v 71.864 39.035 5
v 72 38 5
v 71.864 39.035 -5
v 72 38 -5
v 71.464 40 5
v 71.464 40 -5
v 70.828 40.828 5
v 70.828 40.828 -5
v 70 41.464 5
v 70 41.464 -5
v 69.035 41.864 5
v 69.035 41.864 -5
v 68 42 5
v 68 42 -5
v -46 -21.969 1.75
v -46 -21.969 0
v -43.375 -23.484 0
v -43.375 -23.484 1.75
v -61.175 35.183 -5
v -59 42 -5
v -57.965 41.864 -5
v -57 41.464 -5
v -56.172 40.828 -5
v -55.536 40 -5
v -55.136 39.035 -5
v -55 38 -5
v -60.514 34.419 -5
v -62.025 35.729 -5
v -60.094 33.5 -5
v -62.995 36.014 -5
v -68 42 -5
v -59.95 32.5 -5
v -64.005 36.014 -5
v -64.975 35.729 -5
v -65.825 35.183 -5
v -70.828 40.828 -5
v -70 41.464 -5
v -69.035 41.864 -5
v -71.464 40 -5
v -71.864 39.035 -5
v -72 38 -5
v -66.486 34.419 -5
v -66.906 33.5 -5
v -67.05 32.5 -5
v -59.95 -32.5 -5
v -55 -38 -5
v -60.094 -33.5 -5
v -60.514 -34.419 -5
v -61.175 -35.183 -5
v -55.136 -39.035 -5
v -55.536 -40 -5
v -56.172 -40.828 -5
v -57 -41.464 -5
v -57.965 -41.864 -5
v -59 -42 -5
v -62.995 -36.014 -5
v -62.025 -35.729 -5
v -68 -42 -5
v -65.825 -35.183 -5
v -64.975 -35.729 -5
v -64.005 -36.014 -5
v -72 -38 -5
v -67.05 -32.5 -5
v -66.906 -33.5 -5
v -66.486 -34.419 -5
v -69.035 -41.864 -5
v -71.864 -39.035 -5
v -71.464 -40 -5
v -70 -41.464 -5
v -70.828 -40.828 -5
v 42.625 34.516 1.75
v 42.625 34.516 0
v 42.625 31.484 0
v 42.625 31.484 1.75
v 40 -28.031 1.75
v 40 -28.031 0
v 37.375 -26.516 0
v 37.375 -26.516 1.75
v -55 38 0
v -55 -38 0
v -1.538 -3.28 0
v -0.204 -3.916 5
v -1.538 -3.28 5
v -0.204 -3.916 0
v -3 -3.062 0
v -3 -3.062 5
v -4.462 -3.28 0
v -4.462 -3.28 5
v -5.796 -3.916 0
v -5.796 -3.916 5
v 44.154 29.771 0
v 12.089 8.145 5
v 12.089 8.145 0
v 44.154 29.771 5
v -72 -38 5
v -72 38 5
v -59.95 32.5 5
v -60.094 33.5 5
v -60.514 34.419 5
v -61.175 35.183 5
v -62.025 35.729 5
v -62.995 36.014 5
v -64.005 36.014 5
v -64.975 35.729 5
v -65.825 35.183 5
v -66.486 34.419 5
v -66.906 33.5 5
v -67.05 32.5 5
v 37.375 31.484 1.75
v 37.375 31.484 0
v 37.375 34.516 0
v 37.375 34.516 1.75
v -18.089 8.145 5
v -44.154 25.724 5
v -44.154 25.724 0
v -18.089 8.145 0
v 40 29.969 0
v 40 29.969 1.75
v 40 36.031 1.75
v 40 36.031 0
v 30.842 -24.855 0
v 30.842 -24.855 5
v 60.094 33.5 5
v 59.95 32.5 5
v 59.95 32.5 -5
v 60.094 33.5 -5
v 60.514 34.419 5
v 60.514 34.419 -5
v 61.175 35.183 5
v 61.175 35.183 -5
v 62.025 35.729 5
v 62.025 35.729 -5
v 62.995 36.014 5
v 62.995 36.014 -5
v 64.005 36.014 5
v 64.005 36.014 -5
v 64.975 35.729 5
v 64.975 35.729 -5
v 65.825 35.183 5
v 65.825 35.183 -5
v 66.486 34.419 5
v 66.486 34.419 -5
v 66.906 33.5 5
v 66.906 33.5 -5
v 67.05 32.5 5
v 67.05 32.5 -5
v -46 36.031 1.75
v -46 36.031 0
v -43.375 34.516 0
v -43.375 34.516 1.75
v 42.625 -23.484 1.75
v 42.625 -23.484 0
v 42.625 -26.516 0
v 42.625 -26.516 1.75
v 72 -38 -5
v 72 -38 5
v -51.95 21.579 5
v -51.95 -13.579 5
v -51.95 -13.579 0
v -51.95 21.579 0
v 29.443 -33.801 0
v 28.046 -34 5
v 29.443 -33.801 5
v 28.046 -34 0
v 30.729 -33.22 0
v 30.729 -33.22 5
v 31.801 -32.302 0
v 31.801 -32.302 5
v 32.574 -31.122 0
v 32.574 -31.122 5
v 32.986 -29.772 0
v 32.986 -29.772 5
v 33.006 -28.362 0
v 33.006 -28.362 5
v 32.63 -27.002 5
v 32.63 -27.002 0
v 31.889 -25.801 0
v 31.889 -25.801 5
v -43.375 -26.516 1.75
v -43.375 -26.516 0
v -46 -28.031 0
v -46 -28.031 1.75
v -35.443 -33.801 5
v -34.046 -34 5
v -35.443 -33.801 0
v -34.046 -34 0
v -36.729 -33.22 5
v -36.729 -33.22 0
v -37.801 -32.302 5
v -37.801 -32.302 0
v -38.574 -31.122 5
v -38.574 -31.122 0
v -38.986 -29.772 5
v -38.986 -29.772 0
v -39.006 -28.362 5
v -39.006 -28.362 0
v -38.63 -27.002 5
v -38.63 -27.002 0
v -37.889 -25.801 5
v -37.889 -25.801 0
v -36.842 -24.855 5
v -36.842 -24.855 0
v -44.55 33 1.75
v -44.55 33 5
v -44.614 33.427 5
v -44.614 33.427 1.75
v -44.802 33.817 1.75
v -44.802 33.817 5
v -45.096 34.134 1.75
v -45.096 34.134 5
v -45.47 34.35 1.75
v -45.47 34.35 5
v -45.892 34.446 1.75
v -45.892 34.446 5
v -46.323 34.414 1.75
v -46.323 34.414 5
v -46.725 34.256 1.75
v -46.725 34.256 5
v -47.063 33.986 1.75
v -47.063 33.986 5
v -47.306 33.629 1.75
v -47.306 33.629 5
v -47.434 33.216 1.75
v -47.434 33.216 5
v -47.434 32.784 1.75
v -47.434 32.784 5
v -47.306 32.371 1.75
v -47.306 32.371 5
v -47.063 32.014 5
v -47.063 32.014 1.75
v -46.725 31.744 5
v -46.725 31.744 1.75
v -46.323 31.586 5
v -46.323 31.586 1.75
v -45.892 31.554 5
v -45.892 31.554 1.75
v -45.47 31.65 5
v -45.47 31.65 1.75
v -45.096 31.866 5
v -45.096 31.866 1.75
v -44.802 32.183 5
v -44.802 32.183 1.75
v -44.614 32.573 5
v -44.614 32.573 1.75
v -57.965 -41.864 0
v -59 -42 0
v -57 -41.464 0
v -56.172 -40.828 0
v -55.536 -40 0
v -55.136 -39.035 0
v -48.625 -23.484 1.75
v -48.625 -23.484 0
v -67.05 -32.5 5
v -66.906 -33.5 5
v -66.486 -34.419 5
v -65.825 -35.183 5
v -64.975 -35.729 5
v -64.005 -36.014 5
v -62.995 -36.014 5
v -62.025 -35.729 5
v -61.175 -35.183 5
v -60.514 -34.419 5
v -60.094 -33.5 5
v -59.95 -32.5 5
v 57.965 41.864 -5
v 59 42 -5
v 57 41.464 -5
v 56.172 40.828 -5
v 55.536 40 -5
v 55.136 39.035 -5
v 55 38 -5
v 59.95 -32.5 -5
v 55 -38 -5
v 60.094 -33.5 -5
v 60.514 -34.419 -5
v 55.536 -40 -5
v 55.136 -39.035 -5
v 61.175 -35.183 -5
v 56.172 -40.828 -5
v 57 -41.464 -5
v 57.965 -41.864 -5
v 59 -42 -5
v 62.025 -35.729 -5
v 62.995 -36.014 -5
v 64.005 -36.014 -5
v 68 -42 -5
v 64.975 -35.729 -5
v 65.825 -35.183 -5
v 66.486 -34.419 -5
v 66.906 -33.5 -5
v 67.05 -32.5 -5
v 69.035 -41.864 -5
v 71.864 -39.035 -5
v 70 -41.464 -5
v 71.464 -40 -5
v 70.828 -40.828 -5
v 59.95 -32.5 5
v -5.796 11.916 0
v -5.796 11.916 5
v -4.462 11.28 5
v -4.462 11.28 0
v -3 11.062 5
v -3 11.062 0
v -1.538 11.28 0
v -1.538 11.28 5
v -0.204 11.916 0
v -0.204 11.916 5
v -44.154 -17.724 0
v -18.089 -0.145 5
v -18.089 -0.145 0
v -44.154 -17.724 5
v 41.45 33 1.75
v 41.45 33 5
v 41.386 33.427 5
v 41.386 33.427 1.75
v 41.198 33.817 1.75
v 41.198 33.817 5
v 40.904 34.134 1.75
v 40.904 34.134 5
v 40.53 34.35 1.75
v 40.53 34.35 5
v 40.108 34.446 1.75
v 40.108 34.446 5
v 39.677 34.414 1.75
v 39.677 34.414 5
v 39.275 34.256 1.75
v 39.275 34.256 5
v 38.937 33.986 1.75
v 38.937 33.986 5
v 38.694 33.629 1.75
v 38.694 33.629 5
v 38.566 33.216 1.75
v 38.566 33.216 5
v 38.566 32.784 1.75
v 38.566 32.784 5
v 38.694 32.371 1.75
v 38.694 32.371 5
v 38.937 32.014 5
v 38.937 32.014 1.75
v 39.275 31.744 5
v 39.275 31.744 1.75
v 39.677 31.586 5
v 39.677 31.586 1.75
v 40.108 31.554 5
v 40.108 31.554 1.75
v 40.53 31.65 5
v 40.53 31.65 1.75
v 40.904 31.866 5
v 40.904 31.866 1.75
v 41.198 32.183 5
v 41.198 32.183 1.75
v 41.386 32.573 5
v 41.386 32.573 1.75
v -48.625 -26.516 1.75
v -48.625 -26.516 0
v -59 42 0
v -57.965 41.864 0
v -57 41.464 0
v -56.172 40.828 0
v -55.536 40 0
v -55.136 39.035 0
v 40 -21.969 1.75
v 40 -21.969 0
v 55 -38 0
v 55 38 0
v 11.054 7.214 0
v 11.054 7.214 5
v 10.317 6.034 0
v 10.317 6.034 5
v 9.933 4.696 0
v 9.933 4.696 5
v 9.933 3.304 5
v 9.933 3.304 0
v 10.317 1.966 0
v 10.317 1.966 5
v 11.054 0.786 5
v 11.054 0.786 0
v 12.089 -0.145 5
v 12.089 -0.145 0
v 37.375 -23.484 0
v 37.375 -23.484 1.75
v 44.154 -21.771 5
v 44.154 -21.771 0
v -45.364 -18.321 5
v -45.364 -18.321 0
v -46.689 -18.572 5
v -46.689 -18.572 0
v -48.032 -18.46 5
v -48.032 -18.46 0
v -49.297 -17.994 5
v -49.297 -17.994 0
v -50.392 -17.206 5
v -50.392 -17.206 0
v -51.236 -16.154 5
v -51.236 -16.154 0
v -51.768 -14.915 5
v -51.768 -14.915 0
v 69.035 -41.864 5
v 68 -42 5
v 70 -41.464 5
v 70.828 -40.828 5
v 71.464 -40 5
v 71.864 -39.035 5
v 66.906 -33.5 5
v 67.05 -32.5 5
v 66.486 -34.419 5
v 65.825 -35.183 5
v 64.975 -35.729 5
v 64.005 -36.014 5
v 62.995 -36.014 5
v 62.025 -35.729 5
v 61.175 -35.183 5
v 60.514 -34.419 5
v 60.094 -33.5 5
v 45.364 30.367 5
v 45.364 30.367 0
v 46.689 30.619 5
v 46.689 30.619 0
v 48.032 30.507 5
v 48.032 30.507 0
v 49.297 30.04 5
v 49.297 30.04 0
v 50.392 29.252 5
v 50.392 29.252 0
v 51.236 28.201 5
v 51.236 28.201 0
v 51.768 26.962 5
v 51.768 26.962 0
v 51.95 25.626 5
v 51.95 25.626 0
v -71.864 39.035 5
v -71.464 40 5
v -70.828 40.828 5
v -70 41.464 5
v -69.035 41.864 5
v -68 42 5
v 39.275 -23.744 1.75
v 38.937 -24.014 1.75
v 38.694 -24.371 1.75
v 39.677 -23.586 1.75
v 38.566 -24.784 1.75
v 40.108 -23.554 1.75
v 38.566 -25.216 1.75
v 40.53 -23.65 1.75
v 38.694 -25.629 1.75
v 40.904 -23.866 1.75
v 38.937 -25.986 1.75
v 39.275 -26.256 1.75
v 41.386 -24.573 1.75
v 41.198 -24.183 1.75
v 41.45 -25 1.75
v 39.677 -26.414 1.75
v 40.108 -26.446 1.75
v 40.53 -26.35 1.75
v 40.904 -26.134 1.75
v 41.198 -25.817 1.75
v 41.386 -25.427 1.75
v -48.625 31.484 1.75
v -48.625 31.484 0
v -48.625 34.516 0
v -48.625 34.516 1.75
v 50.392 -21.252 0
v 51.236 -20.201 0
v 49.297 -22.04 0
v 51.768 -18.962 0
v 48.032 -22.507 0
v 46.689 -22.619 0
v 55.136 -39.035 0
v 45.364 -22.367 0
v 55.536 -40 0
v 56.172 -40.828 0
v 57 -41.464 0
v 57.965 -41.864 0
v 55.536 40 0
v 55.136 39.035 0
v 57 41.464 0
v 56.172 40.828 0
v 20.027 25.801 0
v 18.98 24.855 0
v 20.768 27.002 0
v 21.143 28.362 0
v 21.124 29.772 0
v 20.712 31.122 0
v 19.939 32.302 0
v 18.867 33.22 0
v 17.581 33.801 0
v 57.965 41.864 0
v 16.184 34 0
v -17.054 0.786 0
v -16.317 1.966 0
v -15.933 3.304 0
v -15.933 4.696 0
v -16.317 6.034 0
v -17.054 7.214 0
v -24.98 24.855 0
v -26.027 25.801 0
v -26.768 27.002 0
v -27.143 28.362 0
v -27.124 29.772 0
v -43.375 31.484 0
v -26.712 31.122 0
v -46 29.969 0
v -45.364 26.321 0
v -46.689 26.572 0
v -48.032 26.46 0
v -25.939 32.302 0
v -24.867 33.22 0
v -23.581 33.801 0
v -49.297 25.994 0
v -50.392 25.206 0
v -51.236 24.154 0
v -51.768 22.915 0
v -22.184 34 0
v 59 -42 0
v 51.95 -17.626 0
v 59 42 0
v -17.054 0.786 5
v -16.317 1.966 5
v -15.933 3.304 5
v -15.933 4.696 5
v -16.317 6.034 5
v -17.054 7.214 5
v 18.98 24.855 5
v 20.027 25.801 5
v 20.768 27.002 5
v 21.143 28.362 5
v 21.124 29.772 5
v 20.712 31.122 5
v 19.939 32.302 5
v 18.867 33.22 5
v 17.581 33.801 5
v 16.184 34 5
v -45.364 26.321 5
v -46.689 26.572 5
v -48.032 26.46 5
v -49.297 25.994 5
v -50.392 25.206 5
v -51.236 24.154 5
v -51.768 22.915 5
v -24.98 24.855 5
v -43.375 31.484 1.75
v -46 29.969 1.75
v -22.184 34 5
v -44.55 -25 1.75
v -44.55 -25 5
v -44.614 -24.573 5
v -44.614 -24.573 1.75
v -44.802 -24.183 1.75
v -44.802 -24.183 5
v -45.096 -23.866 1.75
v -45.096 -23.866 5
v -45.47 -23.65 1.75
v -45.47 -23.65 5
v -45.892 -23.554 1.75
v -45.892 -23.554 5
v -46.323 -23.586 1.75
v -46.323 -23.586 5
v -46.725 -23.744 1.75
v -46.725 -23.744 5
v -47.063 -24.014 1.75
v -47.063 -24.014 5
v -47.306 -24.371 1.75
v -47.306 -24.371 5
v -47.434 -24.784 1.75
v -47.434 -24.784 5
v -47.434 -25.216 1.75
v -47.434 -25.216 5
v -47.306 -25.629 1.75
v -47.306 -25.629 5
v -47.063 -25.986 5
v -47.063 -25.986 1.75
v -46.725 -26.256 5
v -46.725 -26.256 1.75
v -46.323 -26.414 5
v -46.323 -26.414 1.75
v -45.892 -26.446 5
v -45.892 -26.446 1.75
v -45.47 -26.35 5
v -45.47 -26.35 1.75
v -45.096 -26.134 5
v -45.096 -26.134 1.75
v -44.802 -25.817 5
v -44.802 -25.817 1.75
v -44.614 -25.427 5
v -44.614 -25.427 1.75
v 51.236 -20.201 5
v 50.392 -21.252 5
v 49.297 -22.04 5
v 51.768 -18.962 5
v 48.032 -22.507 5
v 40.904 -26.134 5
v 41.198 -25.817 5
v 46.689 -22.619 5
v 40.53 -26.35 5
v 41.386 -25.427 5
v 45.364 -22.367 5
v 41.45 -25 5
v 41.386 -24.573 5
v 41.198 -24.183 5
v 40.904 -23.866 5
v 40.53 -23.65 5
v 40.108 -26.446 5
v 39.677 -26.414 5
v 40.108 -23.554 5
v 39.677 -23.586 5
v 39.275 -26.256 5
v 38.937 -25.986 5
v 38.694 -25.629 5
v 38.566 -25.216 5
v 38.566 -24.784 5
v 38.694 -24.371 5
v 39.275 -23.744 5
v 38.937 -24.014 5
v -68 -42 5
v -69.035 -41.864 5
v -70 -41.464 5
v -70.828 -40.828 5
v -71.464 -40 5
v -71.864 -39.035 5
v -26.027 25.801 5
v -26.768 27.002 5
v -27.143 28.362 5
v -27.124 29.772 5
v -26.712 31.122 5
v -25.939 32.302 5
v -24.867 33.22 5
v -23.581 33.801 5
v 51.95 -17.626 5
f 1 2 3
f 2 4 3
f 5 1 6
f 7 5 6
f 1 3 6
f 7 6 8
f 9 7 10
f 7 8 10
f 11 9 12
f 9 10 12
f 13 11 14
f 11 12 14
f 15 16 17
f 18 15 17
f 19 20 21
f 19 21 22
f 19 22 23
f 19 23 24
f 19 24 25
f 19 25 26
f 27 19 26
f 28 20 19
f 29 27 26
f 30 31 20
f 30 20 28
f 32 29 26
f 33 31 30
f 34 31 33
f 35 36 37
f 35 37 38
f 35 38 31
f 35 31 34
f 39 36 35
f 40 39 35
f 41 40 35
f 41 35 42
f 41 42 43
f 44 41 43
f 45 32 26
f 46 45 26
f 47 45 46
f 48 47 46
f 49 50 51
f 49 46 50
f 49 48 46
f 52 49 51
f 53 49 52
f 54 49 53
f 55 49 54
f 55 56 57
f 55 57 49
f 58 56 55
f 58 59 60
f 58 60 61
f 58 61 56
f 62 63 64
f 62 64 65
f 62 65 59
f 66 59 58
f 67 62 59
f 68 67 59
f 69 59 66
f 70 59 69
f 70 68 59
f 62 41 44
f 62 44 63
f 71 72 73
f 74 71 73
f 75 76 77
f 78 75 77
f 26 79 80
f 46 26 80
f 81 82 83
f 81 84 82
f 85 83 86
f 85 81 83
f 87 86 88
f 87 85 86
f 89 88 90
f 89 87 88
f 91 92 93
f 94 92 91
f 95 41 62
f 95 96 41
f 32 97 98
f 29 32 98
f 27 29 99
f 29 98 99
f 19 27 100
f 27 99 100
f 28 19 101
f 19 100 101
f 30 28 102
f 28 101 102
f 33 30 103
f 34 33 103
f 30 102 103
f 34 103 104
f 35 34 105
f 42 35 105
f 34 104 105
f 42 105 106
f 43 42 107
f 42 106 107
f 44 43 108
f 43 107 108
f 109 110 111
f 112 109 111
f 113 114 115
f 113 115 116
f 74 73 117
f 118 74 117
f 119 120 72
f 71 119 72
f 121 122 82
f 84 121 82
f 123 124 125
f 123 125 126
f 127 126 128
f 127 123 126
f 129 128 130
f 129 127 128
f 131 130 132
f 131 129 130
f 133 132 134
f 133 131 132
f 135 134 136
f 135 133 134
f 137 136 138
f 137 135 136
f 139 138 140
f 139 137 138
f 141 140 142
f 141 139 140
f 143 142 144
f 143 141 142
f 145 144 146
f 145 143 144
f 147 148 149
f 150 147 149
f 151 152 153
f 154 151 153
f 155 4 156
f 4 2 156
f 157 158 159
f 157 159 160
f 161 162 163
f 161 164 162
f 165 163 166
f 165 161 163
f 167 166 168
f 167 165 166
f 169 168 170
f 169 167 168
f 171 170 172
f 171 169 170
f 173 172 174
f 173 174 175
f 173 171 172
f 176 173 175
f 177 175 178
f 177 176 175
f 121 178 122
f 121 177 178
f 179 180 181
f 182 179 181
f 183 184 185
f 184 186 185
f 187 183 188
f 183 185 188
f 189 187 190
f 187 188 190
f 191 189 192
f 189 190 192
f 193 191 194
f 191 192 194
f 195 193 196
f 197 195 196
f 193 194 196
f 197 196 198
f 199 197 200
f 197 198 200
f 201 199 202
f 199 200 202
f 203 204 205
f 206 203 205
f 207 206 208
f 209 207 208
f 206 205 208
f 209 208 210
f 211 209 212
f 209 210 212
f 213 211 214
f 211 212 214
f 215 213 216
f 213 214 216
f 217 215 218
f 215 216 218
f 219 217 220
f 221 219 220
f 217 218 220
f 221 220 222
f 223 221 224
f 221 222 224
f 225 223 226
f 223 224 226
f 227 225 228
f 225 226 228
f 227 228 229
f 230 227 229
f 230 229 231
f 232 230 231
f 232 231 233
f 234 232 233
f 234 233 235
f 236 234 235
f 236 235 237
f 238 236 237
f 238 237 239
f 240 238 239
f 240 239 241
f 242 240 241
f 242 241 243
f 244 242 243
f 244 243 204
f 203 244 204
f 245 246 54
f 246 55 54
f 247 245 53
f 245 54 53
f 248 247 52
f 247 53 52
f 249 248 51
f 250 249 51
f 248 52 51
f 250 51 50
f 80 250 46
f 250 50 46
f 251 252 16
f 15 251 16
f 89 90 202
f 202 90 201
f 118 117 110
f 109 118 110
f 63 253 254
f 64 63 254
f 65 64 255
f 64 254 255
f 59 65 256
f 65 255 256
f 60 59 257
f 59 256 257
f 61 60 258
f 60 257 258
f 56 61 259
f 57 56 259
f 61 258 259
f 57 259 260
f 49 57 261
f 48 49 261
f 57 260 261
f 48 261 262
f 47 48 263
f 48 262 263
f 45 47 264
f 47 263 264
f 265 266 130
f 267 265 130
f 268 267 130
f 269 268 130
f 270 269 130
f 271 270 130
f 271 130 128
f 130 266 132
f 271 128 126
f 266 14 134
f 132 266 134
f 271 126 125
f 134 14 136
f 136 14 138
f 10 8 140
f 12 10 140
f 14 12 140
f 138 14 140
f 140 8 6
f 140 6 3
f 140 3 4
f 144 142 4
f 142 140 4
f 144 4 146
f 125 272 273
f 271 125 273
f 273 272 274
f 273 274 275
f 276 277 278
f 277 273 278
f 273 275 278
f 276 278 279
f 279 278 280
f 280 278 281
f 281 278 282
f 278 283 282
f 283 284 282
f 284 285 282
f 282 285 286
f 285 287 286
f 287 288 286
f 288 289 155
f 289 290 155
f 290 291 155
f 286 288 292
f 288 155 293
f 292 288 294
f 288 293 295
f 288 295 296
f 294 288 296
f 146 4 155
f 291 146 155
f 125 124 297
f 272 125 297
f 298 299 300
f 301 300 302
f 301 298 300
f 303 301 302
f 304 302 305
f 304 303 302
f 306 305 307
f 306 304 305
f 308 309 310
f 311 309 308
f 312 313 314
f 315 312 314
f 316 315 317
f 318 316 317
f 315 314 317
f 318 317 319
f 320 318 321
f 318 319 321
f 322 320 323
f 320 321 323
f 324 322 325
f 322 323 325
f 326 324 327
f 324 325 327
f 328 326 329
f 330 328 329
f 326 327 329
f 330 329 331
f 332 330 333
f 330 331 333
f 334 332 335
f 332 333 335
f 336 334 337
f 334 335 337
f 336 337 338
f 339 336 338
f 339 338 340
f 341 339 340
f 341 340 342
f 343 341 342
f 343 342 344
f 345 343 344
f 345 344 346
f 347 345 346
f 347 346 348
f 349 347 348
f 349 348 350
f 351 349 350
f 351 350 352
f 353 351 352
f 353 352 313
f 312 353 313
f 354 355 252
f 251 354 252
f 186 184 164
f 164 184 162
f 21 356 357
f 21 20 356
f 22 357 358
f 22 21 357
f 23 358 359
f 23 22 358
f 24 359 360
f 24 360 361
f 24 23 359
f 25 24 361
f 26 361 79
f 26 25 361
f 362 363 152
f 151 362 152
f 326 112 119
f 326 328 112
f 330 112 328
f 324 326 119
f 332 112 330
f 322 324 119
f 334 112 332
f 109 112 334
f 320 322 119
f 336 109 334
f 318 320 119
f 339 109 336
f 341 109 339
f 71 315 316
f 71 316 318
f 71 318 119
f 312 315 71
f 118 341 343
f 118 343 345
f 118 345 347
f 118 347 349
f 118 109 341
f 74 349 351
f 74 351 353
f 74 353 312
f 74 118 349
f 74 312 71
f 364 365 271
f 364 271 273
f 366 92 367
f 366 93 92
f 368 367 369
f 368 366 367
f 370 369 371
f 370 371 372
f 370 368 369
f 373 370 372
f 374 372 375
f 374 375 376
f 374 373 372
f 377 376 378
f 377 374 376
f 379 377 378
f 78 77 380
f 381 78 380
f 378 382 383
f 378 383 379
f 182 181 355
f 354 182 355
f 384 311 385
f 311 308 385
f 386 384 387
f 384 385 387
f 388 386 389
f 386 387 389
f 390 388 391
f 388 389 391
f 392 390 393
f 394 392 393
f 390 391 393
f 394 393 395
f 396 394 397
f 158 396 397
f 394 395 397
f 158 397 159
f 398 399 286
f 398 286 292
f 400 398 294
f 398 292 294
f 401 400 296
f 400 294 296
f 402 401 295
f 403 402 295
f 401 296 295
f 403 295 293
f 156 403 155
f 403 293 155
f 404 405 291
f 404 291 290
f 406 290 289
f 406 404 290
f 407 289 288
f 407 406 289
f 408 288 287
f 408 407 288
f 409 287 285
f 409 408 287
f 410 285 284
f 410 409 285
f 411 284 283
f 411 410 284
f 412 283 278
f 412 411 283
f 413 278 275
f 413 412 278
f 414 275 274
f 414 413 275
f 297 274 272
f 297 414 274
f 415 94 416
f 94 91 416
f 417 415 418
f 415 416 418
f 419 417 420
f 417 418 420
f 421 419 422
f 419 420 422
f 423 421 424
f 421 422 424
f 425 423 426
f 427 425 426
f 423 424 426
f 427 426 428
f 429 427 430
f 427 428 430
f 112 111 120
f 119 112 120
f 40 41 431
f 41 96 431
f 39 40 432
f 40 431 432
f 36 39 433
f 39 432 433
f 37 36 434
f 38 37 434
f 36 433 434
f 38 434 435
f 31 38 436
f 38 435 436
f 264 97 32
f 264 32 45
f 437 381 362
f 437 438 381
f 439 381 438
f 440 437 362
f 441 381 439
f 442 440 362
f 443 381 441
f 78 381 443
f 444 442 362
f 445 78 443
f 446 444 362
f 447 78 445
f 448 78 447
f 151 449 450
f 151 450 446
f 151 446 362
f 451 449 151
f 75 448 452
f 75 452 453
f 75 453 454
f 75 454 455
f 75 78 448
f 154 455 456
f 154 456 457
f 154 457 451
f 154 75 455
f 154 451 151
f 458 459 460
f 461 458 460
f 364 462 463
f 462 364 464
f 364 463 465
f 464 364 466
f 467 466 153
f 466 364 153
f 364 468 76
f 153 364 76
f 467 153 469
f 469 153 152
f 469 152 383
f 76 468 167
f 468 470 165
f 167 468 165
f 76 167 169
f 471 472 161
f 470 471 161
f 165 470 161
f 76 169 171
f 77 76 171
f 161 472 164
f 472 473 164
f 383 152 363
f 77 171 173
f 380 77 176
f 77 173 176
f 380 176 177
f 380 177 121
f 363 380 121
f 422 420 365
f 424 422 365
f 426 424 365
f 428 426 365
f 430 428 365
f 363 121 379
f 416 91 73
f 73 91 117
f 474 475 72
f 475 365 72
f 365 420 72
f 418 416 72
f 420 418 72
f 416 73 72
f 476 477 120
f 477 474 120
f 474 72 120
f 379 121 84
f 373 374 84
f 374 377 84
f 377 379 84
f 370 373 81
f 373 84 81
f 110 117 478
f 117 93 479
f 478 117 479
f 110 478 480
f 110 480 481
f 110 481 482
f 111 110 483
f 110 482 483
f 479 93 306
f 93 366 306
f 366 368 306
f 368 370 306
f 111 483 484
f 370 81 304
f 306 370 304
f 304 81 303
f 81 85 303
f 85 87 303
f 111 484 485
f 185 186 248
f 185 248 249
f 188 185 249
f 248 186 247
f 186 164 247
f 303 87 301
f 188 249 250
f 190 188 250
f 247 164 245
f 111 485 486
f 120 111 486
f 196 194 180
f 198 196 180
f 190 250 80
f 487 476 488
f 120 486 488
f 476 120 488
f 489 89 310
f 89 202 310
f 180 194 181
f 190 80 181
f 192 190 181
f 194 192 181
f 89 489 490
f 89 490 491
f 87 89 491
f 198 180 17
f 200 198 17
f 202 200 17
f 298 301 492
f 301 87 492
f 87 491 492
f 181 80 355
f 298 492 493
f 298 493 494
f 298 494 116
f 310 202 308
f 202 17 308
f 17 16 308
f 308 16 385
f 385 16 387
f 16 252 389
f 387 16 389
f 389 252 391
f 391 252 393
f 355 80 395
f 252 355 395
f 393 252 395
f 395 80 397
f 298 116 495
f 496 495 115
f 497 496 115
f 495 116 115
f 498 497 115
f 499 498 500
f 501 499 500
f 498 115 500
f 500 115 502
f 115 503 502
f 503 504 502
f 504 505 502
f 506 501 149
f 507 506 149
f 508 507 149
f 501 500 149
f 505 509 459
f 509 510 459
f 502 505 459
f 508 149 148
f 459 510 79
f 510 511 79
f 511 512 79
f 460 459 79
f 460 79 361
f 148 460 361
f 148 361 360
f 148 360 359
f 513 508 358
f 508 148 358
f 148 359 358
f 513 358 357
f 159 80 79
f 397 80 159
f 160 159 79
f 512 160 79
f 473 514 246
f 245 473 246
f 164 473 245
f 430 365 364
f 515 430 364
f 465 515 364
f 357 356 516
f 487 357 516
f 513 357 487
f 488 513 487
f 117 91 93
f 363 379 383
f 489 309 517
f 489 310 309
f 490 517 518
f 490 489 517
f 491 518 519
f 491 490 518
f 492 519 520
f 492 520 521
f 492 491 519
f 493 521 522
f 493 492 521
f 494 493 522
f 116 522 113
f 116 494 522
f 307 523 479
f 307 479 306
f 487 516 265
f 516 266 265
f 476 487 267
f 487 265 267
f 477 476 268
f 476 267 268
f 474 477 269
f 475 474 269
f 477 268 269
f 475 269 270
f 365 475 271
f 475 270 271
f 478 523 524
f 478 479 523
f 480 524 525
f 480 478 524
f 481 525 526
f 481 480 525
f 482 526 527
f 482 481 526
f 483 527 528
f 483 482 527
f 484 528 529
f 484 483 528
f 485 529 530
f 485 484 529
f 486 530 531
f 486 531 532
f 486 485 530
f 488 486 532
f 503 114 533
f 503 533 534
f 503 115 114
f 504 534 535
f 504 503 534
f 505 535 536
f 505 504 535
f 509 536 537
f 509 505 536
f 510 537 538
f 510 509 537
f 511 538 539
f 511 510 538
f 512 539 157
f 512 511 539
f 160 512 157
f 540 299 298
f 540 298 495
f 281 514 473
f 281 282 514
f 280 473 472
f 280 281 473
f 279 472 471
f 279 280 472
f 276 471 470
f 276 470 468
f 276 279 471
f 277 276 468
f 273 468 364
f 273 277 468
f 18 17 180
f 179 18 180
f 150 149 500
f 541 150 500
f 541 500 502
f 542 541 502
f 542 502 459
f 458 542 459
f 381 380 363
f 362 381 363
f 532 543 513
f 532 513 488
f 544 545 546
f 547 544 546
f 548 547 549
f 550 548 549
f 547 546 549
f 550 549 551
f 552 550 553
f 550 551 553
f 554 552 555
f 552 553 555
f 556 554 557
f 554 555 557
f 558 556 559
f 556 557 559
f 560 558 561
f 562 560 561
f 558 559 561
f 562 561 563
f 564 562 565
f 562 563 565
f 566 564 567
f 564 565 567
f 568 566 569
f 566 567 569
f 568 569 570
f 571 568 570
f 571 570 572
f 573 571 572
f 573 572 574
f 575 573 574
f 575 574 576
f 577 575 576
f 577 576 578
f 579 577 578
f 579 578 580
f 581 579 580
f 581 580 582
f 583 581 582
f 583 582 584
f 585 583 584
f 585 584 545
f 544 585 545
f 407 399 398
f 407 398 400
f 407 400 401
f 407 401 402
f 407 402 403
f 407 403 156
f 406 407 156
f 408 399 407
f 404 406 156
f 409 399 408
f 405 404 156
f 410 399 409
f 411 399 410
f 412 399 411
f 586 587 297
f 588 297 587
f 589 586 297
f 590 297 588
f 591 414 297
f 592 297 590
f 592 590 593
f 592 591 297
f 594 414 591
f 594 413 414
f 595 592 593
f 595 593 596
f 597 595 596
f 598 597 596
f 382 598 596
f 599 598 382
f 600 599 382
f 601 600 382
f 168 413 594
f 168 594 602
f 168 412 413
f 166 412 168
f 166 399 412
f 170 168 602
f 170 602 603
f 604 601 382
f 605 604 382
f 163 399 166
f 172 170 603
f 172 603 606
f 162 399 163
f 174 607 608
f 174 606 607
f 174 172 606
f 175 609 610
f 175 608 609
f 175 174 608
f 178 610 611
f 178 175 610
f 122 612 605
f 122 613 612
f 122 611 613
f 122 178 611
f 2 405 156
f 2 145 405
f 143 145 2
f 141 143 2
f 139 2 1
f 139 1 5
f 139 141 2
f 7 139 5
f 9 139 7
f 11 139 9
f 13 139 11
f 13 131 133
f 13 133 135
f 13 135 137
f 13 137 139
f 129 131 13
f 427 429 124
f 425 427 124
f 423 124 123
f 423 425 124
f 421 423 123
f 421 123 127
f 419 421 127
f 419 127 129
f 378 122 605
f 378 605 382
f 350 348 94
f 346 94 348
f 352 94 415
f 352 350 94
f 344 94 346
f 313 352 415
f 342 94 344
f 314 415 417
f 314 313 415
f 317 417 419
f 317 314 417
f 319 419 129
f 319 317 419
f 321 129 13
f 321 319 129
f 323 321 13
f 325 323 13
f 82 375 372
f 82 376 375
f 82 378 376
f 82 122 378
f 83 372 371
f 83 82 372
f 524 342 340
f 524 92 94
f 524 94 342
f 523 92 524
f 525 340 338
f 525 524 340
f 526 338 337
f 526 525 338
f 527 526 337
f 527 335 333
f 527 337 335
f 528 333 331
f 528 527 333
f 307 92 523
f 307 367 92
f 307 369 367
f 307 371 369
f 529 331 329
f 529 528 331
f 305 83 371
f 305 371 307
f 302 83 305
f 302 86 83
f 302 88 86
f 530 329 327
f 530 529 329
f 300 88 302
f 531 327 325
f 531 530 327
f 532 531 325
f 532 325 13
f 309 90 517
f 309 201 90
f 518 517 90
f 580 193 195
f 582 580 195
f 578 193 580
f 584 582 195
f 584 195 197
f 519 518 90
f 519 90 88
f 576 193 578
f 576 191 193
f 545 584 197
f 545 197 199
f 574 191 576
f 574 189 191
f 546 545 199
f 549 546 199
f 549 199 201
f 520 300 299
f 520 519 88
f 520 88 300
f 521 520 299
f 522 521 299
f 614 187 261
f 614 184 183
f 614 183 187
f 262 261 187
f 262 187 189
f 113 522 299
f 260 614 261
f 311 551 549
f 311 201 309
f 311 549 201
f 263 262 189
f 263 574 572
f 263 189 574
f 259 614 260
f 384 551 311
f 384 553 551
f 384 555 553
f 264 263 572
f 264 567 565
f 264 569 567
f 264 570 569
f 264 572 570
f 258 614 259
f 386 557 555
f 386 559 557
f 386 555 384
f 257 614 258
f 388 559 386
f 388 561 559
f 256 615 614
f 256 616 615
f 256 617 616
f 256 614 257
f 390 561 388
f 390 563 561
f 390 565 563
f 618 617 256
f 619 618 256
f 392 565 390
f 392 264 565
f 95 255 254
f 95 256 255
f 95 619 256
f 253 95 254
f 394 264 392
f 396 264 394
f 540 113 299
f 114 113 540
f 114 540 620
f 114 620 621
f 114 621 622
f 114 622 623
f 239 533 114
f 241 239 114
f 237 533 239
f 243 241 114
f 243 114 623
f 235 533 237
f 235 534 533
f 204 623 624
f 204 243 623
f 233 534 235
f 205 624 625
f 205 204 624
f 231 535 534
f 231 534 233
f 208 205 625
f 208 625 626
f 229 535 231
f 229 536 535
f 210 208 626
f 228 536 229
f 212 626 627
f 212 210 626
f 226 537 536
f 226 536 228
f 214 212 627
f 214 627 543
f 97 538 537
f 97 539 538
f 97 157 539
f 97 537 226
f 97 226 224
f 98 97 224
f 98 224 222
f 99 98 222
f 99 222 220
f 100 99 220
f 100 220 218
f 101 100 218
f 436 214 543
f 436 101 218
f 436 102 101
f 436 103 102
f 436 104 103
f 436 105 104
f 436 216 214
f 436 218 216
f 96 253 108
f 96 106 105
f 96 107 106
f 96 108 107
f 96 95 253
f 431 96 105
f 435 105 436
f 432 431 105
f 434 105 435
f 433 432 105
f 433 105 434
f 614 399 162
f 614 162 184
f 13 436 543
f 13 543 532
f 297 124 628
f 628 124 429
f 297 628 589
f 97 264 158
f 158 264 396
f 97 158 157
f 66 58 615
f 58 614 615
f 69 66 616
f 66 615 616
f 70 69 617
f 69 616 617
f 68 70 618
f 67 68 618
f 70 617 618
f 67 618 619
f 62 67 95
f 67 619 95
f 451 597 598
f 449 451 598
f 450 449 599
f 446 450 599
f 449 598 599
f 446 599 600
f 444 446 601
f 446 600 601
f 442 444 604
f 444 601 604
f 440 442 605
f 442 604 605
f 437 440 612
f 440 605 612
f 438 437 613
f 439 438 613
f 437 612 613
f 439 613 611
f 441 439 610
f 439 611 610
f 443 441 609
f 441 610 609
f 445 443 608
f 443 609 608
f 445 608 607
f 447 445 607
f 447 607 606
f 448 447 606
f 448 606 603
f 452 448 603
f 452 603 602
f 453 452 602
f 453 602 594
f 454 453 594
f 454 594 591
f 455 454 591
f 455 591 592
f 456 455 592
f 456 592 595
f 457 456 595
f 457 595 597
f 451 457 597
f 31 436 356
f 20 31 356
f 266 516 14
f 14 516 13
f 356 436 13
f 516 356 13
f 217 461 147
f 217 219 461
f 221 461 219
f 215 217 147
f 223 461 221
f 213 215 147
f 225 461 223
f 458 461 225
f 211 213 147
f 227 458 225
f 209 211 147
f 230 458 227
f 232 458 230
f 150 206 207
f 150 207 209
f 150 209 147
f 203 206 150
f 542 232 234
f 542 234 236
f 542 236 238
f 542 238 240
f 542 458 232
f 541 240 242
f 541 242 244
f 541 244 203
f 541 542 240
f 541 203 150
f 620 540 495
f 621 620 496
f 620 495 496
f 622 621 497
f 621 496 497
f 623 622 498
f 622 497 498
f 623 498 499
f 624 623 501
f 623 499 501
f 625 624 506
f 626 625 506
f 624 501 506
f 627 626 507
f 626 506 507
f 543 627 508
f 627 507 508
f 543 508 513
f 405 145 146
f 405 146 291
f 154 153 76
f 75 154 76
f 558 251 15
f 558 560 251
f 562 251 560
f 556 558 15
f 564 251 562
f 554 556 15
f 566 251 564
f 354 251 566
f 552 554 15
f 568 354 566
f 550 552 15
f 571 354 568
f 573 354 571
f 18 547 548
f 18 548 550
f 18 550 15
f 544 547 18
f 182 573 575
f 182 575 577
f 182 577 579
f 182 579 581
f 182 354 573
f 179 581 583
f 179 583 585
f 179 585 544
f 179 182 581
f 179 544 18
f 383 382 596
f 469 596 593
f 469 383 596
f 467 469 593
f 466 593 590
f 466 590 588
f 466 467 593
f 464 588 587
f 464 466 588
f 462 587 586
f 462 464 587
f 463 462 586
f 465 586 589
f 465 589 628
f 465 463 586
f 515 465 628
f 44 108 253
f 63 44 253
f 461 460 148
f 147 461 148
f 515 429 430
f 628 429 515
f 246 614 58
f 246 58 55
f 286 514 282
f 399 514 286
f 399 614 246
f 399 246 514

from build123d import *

# Parameters (mm, degrees)
SKETCH_W                     = 110
SKETCH_H                     = 84
PAD_DEPTH                    = 5
SKETCH001_R                  = 1.45
HOLE_DEPTH                   = 281.991975
POCKET_DEPTH                 = 1.75
SKETCH001_LINEARPATTERN_2_R  = 1.45
HOLE_LINEARPATTERN_2_DEPTH   = 281.991975
POCKET_LINEARPATTERN_2_DEPTH = 1.75
LINEARPATTERN001_COUNT       = 2
LINEARPATTERN001_PITCH       = 58
MULTITRANSFORM_FACE2_W       = 84
MULTITRANSFORM_FACE2_H       = 5
PAD001_DEPTH                 = 17
PAD001_FACE6_W               = 84
PAD001_FACE6_H               = 17
PAD002_DEPTH                 = 5
POCKET001_DEPTH              = 315.189466
POCKET002_DEPTH              = 10.001
FILLET_R                     = 5
FILLET001_R                  = 4


with BuildPart() as part:
    # Sketch → Pad (new body)
    with BuildSketch(Plane.XY):
        Rectangle(SKETCH_W, SKETCH_H)
    extrude(amount=PAD_DEPTH)

    # Sketch001 (on Face6 of Pad) → Hole (cut, through all)
    with BuildSketch(Plane.XY.offset(5)):
        with Locations((-46, 33)):
            Circle(SKETCH001_R)
    hole = extrude(amount=-HOLE_DEPTH, mode=Mode.SUBTRACT)

    # Sketch002 (on Face4 of Hole) → Pocket (cut)
    with BuildSketch(Plane(origin=(0, 0, 0), x_dir=(1, 0, 0), z_dir=(0, 0, -1))):
        Polygon((-46, -36.031089), (-43.375, -34.515544), (-43.375, -31.484456), (-46, -29.968911), (-48.625, -31.484456), (-48.625, -34.515544), align=None)
    pocket = extrude(amount=-POCKET_DEPTH, mode=Mode.SUBTRACT)

    # Sketch001 LinearPattern 2 → Hole LinearPattern 2 (cut, through all)
    with BuildSketch(Plane(origin=(86, 0, 5), x_dir=(1, 0, 0), z_dir=(0, 0, 1))):
        with Locations((-46, 33)):
            Circle(SKETCH001_LINEARPATTERN_2_R)
    hole_linearpattern_2 = extrude(amount=-HOLE_LINEARPATTERN_2_DEPTH, mode=Mode.SUBTRACT)

    # Sketch002 LinearPattern 2 → Pocket LinearPattern 2 (cut)
    with BuildSketch(Plane(origin=(86, 0, 0), x_dir=(1, 0, 0), z_dir=(0, 0, -1))):
        Polygon((-46, -36.031089), (-43.375, -34.515544), (-43.375, -31.484456), (-46, -29.968911), (-48.625, -31.484456), (-48.625, -34.515544), align=None)
    pocket_linearpattern_2 = extrude(amount=-POCKET_LINEARPATTERN_2_DEPTH, mode=Mode.SUBTRACT)

    # LinearPattern001: Hole, Pocket, Hole LinearPattern 2, Pocket LinearPattern 2 ×2
    with Locations(*[(0, -i * LINEARPATTERN001_PITCH, 0) for i in range(1, LINEARPATTERN001_COUNT)]):
        add(hole, mode=Mode.SUBTRACT)
        add(pocket, mode=Mode.SUBTRACT)
        add(hole_linearpattern_2, mode=Mode.SUBTRACT)
        add(pocket_linearpattern_2, mode=Mode.SUBTRACT)

    # MultiTransform Face2 → Pad001 (add)
    with BuildSketch(Plane(origin=(-55, 0, 2.5), x_dir=(0, 1, 0), z_dir=(-1, 0, 0))):
        Rectangle(MULTITRANSFORM_FACE2_W, MULTITRANSFORM_FACE2_H)
    pad001 = extrude(amount=PAD001_DEPTH)

    # Pad001 Face6 → Pad002 (add)
    with BuildSketch(Plane(origin=(-63.5, 0, 0), x_dir=(0, -1, 0), z_dir=(0, 0, -1))):
        Rectangle(PAD001_FACE6_W, PAD001_FACE6_H)
    pad002 = extrude(amount=PAD002_DEPTH)

    # Sketch003 (on Face7 of Pad002) → Pocket001 (cut, through all)
    with BuildSketch(Plane.XY.offset(5)):
        with BuildLine():
            ThreePointArc((-59.95, 32.5), (-63.5, 36.05), (-67.05, 32.5))
            Line((-67.05, 32.5), (-67.05, -32.5))
            ThreePointArc((-67.05, -32.5), (-63.5, -36.05), (-59.95, -32.5))
            Line((-59.95, 32.5), (-59.95, -32.5))
        make_face()
    pocket001 = extrude(amount=-POCKET001_DEPTH, mode=Mode.SUBTRACT)

    # Mirrored: Pad001, Pad002, Pocket001 across YZ
    add(pad001.mirror(Plane.YZ))
    add(pad002.mirror(Plane.YZ))
    add(pocket001.mirror(Plane.YZ), mode=Mode.SUBTRACT)

    # Sketch004 (on Face5 of Mirrored) → Pocket002 (cut, through all)
    with BuildSketch(Plane.XY.offset(5)):
        Polygon((-38.540481, 34), (32.540481, 34), (-3, 10.030838), align=None)
        Polygon((-51.95, -22.981952), (-51.95, 30.981952), (-11.942278, 4), align=None)
        Polygon((-50.40255, -34), (44.40255, -34), (-3, -2.030838), align=None)
        Polygon((51.95, 35.028464), (51.95, -27.028464), (5.942278, 4), align=None)
    extrude(amount=-POCKET002_DEPTH, mode=Mode.SUBTRACT)

    # Fillet
    fillet_edges = [part.edges().sort_by_distance(p)[0] for p in [
        (-51.95, 30.981952, 2.5),
        (-51.95, -22.981952, 2.5),
        (-11.942278, 4, 2.5),
        (44.40255, -34, 2.5),
        (-50.40255, -34, 2.5),
        (-3, -2.030838, 2.5),
        (5.942278, 4, 2.5),
        (51.95, -27.028464, 2.5),
        (51.95, 35.028464, 2.5),
        (-38.540481, 34, 2.5),
        (-3, 10.030838, 2.5),
        (32.540481, 34, 2.5),
    ]]
    fillet(fillet_edges, radius=FILLET_R)

    # Fillet001
    fillet001_edges = [part.edges().sort_by_distance(p)[0] for p in [
        (-72, 42, 2.5),
        (-72, 42, -2.5),
        (-72, -42, -2.5),
        (-72, -42, 2.5),
        (72, 42, 2.5),
        (72, 42, -2.5),
        (72, -42, 2.5),
        (72, -42, -2.5),
        (55, 42, -2.5),
        (55, -42, -2.5),
        (-55, 42, -2.5),
        (-55, -42, -2.5),
    ]]
    fillet(fillet001_edges, radius=FILLET001_R)


solid = part.part
